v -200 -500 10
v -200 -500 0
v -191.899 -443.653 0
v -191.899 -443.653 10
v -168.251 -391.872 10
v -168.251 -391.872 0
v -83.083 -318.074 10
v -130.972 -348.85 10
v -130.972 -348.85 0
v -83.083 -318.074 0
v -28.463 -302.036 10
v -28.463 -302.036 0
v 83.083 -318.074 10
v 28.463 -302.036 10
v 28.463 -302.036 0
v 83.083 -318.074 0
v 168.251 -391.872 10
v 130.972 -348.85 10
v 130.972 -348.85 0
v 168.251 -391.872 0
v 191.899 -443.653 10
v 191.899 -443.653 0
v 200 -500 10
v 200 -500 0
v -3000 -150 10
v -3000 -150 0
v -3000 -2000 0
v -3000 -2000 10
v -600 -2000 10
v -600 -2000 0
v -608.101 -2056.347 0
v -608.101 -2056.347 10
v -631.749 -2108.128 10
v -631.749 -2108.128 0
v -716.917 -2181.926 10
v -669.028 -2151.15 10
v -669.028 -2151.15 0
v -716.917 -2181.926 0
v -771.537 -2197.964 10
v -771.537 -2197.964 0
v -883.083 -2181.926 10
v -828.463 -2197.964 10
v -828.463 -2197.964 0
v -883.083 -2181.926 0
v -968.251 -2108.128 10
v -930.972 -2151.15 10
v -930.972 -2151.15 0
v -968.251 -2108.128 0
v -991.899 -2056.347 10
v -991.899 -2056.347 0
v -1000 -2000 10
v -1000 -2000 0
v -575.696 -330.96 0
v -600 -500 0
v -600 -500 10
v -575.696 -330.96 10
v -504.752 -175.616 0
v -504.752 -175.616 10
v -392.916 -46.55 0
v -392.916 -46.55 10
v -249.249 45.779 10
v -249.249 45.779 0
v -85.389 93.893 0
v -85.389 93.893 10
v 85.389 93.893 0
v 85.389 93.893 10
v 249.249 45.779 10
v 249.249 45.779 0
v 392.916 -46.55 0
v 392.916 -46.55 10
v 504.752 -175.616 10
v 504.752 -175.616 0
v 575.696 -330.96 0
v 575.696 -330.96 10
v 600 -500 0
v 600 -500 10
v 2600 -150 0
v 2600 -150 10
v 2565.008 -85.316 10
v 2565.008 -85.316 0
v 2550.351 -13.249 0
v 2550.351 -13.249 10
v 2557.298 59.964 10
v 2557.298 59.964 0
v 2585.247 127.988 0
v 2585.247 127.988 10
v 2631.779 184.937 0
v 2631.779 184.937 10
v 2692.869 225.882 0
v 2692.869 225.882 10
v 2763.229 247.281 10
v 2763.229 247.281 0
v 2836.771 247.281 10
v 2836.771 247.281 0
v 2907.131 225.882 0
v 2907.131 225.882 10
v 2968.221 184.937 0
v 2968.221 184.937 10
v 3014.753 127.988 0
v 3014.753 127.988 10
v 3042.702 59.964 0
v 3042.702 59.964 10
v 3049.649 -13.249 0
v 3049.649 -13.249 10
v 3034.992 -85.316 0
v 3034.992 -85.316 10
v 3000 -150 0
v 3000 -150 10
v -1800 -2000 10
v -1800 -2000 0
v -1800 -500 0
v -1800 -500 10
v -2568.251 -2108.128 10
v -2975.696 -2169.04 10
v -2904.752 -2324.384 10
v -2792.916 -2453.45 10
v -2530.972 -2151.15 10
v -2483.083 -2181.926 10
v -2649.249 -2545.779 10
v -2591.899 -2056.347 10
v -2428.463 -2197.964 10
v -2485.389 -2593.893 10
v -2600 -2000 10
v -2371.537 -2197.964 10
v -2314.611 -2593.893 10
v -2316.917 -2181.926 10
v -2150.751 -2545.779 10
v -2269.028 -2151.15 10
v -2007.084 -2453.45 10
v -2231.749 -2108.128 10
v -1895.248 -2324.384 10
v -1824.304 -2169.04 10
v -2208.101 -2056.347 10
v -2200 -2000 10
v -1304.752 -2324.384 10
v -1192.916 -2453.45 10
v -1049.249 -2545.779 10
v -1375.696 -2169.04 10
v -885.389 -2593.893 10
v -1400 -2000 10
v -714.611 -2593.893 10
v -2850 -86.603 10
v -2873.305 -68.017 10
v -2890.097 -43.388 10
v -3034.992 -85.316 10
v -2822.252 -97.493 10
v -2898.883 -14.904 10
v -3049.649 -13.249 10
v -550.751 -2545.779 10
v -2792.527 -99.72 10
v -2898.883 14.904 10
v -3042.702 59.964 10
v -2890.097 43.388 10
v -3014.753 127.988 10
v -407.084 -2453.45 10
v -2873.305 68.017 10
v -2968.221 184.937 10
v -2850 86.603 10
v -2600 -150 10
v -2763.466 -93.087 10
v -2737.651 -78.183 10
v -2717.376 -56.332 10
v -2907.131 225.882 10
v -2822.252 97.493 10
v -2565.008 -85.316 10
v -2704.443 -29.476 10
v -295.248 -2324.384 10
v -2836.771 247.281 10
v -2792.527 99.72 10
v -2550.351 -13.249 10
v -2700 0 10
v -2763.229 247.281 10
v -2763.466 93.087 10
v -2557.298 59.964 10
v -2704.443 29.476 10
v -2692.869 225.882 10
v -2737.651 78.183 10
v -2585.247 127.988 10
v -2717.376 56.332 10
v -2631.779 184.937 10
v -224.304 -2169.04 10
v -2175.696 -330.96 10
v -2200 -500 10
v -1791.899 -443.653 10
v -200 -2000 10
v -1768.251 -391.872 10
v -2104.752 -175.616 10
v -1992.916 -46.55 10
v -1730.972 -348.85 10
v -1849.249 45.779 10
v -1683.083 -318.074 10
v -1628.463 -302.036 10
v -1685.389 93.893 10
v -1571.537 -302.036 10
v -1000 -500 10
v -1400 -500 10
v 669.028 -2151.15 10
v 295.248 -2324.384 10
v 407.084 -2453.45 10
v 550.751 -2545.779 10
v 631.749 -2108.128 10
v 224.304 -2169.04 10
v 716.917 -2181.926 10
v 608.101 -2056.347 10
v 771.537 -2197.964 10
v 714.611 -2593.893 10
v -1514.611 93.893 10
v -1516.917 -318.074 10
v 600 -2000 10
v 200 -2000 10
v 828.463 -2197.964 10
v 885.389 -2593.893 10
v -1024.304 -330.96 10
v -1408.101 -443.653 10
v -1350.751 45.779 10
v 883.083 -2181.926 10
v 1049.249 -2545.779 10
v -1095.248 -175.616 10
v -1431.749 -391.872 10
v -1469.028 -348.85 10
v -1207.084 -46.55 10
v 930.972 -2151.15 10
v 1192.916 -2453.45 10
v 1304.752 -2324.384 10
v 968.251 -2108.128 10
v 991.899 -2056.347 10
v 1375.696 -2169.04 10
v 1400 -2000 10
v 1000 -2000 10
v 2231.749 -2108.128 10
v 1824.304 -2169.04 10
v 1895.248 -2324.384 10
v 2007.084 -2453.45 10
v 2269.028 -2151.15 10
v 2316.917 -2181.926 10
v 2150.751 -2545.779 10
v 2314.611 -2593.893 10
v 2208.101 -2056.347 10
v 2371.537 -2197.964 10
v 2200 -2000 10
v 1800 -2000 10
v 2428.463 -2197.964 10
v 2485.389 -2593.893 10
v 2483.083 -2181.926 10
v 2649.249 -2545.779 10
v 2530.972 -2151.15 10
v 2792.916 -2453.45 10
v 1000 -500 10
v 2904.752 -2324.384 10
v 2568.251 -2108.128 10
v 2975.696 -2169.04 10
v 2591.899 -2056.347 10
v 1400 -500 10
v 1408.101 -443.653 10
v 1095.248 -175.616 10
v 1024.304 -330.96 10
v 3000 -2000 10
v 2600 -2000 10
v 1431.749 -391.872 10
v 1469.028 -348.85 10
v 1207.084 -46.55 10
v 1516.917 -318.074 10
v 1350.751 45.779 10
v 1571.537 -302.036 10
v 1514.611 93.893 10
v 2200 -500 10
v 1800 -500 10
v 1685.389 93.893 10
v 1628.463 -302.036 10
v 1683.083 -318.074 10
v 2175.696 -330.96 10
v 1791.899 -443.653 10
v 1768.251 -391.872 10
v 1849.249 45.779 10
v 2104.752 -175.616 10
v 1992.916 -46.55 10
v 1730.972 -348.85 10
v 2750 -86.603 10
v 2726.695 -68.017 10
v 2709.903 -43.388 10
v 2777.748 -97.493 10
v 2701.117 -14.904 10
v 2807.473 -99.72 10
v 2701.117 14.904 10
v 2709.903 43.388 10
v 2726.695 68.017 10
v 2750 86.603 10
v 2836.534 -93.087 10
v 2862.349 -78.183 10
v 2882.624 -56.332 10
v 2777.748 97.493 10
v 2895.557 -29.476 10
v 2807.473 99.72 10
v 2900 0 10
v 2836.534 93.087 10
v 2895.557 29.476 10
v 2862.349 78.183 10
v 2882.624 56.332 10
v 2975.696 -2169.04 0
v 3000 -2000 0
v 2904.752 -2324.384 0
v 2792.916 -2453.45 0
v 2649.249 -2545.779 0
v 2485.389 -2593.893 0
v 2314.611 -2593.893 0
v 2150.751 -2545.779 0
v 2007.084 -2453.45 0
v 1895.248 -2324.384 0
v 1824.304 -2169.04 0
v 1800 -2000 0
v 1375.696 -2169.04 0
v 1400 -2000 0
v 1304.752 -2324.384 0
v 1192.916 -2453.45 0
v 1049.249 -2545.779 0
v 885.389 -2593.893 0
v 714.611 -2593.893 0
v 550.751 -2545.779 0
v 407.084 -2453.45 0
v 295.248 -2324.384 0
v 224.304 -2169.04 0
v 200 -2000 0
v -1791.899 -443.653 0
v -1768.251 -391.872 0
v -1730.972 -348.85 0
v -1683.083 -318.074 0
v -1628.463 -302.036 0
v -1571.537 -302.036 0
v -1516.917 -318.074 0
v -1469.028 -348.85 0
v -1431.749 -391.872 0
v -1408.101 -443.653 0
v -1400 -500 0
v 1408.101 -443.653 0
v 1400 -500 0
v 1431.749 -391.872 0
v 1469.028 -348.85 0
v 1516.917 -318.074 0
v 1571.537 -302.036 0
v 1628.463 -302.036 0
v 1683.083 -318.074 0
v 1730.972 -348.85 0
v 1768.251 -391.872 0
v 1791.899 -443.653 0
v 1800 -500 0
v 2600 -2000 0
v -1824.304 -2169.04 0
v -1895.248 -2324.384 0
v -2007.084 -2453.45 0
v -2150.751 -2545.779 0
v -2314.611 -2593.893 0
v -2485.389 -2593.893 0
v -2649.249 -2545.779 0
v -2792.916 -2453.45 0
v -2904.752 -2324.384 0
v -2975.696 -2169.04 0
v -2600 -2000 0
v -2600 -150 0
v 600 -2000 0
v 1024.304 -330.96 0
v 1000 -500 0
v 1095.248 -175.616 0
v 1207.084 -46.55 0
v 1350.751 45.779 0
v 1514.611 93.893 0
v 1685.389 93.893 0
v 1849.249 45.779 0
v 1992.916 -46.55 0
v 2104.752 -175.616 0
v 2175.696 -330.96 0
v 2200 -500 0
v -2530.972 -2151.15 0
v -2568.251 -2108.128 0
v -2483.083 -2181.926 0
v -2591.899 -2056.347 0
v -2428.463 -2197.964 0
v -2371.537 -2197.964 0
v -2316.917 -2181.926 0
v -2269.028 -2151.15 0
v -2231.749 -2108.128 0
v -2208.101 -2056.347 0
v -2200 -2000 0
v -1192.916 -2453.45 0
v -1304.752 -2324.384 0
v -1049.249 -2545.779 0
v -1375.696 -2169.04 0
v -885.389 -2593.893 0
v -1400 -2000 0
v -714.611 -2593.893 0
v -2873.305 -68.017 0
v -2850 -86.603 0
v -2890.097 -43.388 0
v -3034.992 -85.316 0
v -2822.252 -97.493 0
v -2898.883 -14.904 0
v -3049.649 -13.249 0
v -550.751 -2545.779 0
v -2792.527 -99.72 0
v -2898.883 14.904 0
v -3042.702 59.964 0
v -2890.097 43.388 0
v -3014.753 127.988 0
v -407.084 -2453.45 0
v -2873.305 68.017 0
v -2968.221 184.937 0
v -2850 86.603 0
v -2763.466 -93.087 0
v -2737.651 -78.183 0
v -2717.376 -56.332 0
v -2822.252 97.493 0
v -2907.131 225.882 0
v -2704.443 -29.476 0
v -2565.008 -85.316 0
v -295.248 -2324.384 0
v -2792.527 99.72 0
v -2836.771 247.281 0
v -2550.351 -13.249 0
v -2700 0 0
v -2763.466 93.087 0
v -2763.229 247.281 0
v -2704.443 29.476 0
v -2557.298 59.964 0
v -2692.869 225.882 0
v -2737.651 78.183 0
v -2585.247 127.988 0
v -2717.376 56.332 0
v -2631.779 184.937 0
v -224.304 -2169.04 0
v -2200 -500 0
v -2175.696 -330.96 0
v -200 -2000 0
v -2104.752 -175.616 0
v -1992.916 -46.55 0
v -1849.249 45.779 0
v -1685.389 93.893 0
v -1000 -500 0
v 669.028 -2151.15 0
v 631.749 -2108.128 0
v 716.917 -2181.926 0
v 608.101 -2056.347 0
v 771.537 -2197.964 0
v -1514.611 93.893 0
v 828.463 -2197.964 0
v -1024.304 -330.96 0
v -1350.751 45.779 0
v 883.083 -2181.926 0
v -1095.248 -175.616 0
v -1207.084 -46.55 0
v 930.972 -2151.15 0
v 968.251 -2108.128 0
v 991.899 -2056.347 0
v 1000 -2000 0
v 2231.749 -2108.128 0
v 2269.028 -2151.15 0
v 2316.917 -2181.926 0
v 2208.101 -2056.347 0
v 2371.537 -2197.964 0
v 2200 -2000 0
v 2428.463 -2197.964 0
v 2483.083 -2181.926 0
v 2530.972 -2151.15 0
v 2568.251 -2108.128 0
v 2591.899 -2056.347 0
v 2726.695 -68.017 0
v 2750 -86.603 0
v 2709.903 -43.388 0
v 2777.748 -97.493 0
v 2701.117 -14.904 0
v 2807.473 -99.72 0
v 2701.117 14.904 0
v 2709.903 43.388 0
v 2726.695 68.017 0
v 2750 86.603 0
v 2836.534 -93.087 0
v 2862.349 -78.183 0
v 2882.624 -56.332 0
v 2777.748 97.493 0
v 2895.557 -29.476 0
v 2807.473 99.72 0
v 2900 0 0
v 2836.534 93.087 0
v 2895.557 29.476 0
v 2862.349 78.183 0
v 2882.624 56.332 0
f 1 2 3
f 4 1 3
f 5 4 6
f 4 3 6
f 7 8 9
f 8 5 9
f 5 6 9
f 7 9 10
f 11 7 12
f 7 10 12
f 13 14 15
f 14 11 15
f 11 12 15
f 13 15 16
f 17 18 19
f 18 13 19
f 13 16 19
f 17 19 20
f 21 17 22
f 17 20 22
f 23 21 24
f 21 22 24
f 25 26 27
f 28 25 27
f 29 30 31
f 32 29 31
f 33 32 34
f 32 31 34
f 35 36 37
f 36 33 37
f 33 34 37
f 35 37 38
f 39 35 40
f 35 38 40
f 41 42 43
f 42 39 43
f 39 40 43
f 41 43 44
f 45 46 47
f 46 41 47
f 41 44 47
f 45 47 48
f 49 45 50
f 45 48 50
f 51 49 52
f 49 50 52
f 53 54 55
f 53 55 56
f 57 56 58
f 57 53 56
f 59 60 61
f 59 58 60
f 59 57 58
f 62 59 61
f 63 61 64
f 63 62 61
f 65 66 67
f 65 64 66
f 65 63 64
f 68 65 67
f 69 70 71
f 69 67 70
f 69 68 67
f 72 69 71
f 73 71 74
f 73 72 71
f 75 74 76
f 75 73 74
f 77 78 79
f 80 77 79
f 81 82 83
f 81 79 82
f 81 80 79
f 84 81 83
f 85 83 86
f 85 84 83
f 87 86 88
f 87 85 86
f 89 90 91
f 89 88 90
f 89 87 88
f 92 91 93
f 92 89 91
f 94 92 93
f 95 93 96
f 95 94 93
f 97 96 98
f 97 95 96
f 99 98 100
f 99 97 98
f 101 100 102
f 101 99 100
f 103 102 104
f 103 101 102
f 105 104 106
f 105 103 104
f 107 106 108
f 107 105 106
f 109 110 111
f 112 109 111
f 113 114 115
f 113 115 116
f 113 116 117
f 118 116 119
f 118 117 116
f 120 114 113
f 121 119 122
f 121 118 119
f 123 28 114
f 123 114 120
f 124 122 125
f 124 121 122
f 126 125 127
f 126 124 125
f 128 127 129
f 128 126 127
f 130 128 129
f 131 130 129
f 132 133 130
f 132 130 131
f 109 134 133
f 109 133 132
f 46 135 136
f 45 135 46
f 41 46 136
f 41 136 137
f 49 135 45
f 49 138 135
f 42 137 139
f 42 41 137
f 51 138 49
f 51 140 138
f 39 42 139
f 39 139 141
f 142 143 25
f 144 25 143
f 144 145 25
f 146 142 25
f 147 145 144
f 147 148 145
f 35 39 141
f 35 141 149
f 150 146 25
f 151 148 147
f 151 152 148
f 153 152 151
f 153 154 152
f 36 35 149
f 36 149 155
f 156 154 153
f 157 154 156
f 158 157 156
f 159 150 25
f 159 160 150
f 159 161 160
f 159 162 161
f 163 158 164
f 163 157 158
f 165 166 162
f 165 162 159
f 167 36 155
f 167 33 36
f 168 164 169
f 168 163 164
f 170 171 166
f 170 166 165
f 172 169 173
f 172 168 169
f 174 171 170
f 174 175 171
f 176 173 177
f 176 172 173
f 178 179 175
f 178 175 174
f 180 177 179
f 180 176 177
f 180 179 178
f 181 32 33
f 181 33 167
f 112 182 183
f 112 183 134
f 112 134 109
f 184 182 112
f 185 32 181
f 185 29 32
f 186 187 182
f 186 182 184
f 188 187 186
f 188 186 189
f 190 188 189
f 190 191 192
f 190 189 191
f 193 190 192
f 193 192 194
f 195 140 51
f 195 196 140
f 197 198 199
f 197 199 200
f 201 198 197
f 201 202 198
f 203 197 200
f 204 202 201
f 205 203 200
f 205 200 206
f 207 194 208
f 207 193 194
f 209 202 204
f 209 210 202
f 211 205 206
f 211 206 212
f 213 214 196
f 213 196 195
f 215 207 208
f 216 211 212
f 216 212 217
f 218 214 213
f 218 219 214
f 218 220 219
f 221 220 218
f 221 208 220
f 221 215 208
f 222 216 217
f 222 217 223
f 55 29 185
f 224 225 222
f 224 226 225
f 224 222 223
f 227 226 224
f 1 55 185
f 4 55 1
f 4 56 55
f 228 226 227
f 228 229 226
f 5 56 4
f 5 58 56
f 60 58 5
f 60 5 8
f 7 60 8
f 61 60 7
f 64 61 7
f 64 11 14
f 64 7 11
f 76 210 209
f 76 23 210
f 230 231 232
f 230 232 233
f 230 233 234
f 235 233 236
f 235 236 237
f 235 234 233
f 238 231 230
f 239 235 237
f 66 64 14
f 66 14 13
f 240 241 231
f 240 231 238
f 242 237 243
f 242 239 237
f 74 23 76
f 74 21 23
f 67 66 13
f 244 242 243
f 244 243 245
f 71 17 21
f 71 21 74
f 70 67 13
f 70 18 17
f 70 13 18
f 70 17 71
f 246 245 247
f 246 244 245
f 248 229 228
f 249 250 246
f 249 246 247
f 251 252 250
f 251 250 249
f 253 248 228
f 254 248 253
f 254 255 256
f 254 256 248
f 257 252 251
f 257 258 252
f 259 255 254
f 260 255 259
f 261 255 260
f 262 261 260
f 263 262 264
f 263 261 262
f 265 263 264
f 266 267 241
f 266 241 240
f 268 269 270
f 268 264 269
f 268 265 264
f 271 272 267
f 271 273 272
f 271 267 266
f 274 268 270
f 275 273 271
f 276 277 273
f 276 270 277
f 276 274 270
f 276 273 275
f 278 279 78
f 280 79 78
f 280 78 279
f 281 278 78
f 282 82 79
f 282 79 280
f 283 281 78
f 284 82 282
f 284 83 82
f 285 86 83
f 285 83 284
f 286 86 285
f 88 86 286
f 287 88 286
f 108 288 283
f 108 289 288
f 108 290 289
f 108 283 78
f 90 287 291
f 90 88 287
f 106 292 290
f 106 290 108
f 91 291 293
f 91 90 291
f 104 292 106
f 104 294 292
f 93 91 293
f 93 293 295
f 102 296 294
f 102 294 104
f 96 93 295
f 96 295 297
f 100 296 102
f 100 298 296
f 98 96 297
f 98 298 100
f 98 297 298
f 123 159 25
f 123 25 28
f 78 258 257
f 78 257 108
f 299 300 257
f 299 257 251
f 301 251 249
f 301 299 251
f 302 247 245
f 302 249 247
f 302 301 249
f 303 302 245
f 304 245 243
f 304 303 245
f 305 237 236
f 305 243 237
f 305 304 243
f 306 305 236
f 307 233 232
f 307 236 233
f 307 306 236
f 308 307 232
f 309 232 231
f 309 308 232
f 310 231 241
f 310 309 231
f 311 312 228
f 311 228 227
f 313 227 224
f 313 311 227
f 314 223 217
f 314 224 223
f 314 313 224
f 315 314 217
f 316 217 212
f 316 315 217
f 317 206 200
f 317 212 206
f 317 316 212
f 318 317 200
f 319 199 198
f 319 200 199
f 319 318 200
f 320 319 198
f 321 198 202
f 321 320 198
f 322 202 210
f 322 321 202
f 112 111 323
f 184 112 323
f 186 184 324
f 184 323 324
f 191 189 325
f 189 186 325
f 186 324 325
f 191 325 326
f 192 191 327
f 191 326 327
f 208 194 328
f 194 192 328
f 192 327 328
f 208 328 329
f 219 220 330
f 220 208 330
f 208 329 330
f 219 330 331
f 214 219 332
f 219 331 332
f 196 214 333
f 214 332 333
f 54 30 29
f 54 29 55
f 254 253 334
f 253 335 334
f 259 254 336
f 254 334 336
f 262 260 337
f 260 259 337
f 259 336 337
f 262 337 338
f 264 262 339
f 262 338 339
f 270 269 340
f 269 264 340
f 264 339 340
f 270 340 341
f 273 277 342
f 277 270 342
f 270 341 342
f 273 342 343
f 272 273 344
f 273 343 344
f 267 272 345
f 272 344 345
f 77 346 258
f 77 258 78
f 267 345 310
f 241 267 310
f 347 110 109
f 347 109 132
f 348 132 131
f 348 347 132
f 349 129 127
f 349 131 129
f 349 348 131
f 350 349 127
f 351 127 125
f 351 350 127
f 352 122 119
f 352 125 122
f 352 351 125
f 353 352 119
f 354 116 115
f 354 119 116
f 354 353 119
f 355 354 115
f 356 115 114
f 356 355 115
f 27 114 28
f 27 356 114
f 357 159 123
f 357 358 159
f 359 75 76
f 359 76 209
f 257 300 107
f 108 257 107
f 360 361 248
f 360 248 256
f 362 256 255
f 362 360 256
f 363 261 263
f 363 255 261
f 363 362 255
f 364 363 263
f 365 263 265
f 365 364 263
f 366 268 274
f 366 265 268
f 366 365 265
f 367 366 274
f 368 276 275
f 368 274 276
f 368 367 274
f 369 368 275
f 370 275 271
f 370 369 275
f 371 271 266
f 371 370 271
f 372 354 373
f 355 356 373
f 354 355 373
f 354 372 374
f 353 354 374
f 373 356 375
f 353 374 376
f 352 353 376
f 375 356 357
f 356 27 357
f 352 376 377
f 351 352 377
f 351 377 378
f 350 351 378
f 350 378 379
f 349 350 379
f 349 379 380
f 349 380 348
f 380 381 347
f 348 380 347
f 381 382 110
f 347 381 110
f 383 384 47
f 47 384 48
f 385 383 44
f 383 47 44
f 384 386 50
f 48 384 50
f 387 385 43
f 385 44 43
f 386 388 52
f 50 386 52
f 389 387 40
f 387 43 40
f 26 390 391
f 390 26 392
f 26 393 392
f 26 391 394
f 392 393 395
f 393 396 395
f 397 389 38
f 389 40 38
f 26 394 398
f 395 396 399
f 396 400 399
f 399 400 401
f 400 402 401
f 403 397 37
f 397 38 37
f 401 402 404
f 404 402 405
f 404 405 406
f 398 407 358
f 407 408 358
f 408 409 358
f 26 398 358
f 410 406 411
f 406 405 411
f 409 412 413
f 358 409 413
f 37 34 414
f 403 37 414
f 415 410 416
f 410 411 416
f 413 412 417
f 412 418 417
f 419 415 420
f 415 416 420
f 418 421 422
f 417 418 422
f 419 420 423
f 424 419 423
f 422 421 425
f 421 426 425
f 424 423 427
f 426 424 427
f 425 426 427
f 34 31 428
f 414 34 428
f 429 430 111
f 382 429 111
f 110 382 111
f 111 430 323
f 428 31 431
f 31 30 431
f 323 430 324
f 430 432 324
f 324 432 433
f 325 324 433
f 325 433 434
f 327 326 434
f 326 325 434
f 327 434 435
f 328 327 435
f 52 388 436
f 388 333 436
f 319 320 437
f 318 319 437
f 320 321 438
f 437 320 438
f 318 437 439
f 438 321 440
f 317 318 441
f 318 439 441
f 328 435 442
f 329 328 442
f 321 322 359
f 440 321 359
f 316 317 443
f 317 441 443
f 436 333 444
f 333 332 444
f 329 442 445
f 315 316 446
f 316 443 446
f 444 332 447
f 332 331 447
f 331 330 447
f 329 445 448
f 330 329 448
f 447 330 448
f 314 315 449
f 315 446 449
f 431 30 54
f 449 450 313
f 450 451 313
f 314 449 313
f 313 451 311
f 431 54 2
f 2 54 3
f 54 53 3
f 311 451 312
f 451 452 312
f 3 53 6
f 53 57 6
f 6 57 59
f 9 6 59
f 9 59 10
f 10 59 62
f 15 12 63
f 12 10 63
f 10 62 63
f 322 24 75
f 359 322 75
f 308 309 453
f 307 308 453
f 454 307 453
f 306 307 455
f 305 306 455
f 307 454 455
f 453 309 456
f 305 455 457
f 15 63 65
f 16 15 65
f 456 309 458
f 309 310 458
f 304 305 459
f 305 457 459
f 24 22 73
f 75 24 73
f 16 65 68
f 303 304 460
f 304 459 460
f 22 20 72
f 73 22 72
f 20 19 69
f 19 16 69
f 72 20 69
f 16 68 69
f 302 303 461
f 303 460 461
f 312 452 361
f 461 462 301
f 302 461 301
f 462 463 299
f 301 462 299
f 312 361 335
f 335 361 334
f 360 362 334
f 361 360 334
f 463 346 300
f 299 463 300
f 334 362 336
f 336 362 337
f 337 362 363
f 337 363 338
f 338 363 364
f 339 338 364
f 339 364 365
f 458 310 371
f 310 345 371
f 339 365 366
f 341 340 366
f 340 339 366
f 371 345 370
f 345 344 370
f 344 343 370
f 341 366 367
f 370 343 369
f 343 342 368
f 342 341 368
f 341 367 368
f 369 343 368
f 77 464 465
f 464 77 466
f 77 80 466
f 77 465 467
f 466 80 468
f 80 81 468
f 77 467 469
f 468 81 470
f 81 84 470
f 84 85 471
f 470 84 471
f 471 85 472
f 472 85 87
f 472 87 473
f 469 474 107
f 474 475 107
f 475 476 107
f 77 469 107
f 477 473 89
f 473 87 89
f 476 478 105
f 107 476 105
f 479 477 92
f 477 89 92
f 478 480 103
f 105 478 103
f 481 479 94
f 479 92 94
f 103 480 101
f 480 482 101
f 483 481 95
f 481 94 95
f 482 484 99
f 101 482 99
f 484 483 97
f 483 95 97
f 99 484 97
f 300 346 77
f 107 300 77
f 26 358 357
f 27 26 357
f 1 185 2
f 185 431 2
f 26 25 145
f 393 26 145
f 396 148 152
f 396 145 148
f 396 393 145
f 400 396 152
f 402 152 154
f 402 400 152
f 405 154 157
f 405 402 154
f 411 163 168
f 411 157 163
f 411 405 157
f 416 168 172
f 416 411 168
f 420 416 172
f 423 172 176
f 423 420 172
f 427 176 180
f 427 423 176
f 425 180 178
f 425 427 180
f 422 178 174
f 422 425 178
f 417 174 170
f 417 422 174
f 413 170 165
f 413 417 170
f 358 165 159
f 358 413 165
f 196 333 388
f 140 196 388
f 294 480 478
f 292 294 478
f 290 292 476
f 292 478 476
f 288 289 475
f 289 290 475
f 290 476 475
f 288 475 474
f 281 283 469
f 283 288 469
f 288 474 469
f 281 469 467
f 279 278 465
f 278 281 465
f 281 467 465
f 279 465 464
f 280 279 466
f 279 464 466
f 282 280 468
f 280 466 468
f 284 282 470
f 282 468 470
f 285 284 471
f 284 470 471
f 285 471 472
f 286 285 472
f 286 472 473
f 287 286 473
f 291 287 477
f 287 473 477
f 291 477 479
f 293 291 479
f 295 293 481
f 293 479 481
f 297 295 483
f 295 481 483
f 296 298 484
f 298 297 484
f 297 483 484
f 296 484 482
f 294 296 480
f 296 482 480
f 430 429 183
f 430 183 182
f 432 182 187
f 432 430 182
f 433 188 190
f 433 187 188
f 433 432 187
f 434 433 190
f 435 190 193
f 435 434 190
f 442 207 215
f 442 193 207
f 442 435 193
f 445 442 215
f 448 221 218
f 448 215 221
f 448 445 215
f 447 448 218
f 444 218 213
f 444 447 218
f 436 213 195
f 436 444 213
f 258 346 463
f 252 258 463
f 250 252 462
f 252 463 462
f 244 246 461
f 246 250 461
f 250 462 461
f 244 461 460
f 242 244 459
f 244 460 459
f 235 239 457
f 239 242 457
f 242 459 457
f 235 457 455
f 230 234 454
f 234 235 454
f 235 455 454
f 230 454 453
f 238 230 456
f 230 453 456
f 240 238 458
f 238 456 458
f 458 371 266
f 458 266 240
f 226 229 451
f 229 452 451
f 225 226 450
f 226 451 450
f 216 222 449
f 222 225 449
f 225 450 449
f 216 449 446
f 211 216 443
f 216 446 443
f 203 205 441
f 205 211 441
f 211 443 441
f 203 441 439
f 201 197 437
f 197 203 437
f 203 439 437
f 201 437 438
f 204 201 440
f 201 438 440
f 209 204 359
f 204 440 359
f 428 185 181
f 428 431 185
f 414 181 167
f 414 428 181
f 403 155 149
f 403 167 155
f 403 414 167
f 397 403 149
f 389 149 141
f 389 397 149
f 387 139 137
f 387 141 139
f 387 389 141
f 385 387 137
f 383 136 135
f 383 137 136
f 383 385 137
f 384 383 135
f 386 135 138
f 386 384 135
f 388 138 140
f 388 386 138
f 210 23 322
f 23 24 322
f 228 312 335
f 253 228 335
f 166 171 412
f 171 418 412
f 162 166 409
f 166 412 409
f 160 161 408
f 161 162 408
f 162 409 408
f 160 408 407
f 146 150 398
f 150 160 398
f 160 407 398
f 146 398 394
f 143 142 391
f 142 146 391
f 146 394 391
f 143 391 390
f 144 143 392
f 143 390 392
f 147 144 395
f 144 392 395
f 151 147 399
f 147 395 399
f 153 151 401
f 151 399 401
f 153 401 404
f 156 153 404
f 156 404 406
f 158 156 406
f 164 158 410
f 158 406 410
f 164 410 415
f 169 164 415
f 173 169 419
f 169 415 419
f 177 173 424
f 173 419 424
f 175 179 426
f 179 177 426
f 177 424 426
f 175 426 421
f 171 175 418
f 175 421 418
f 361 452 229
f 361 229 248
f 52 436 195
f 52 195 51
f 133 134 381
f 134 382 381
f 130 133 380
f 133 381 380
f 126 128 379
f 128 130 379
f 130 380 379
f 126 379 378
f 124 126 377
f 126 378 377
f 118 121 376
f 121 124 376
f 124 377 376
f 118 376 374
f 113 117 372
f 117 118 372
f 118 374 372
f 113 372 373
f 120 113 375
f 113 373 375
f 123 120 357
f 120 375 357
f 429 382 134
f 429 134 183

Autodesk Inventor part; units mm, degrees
ref_plane "YZ Plane" through (0, 0, 0) normal (1, 0, 0) x (0, 1, 0)
ref_plane "XZ Plane" through (0, 0, 0) normal (0, 1, 0) x (-1, 0, 0)
ref_plane "XY Plane" through (0, 0, 0) normal (0, 0, 1) x (1, 0, 0)
sketch "Sketch3" plane through (0, 0, 0) normal (0, 0, 1) x (1, 0, 0)
  circle A0 centre (-2800, 0) radius 250 construction
  line L0 (-2800, 0) -> (-2800, -2000) construction
  line L1 (-3000, -150) -> (-3000, -2000)
  line L2 (-2600, -150) -> (-2600, -2000)
  circle A1 centre (-2400, -2000) radius 200 construction
  arc A2 (-2600, -2000) -> (-2200, -2000) centre (-2400, -2000) ccw
  circle A3 centre (-2400, -2000) radius 600 construction
  arc A4 (-3000, -2000) -> (-1800, -2000) centre (-2400, -2000) ccw
  line L3 (-2200, -2000) -> (-2200, -500)
  line L4 (-1800, -2000) -> (-1800, -500)
  circle A5 centre (-1600, -500) radius 200 construction
  arc A6 (-1400, -500) -> (-1800, -500) centre (-1600, -500) ccw
  circle A7 centre (-1600, -500) radius 600 construction
  arc A8 (-1000, -500) -> (-2200, -500) centre (-1600, -500) ccw
  line L5 (-1400, -500) -> (-1400, -2000)
  line L6 (-1000, -500) -> (-1000, -2000)
  circle A9 centre (-800, -2000) radius 200 construction
  arc A10 (-1000, -2000) -> (-600, -2000) centre (-800, -2000) ccw
  circle A11 centre (-800, -2000) radius 600 construction
  arc A12 (-1400, -2000) -> (-200, -2000) centre (-800, -2000) ccw
  line L7 (-600, -2000) -> (-600, -500)
  line L8 (-200, -2000) -> (-200, -500)
  circle A13 centre (0, -500) radius 200 construction
  arc A14 (200, -500) -> (-200, -500) centre (0, -500) ccw
  circle A15 centre (0, -500) radius 600 construction
  arc A16 (600, -500) -> (-600, -500) centre (0, -500) ccw
  line L9 (200, -500) -> (200, -2000)
  line L10 (600, -500) -> (600, -2000)
  circle A17 centre (800, -2000) radius 200 construction
  arc A18 (600, -2000) -> (1000, -2000) centre (800, -2000) ccw
  circle A19 centre (800, -2000) radius 600 construction
  arc A20 (200, -2000) -> (1400, -2000) centre (800, -2000) ccw
  line L11 (1000, -2000) -> (1000, -500)
  line L12 (1400, -2000) -> (1400, -500)
  circle A21 centre (1600, -500) radius 200 construction
  arc A22 (1800, -500) -> (1400, -500) centre (1600, -500) ccw
  circle A23 centre (1600, -500) radius 600 construction
  arc A24 (2200, -500) -> (1000, -500) centre (1600, -500) ccw
  line L13 (1800, -500) -> (1800, -2000)
  line L14 (2200, -500) -> (2200, -2000)
  circle A25 centre (2400, -2000) radius 200 construction
  arc A26 (2200, -2000) -> (2600, -2000) centre (2400, -2000) ccw
  circle A27 centre (2400, -2000) radius 600 construction
  arc A28 (1800, -2000) -> (3000, -2000) centre (2400, -2000) ccw
  line L15 (2600, -2000) -> (2600, -150)
  line L16 (3000, -2000) -> (3000, -150)
  circle A29 centre (2800, 0) radius 250 construction
  line L17 (-2800, 0) -> (2800, 0) construction
  circle A30 centre (-2800, 0) radius 100
  circle A31 centre (2800, 0) radius 100
  arc A32 (-2600, -150) -> (-3000, -150) centre (-2800, 0) ccw
  arc A33 (3000, -150) -> (2600, -150) centre (2800, 0) ccw
  point P0 (0, 0)
  point P1 (0, 0)
  point P2 (0, 0)
  dimension "d52" = 500
  dimension "d40" = 500
  dimension "d41" = 2000
  dimension "d42" = 200
  dimension "d44" = 400
  dimension "d45" = 1500
  dimension "d46" = 400
  dimension "d47" = 400
  dimension "d48" = 400
  dimension "d49" = 400
  dimension "d50" = 400
  dimension "d51" = 400
  dimension "d53" = 200
  dimension "d54" = 200
extrude "Extrusion2" add sketch "Sketch3" along normal blind 10
properties part number "sensor-0002-001"
